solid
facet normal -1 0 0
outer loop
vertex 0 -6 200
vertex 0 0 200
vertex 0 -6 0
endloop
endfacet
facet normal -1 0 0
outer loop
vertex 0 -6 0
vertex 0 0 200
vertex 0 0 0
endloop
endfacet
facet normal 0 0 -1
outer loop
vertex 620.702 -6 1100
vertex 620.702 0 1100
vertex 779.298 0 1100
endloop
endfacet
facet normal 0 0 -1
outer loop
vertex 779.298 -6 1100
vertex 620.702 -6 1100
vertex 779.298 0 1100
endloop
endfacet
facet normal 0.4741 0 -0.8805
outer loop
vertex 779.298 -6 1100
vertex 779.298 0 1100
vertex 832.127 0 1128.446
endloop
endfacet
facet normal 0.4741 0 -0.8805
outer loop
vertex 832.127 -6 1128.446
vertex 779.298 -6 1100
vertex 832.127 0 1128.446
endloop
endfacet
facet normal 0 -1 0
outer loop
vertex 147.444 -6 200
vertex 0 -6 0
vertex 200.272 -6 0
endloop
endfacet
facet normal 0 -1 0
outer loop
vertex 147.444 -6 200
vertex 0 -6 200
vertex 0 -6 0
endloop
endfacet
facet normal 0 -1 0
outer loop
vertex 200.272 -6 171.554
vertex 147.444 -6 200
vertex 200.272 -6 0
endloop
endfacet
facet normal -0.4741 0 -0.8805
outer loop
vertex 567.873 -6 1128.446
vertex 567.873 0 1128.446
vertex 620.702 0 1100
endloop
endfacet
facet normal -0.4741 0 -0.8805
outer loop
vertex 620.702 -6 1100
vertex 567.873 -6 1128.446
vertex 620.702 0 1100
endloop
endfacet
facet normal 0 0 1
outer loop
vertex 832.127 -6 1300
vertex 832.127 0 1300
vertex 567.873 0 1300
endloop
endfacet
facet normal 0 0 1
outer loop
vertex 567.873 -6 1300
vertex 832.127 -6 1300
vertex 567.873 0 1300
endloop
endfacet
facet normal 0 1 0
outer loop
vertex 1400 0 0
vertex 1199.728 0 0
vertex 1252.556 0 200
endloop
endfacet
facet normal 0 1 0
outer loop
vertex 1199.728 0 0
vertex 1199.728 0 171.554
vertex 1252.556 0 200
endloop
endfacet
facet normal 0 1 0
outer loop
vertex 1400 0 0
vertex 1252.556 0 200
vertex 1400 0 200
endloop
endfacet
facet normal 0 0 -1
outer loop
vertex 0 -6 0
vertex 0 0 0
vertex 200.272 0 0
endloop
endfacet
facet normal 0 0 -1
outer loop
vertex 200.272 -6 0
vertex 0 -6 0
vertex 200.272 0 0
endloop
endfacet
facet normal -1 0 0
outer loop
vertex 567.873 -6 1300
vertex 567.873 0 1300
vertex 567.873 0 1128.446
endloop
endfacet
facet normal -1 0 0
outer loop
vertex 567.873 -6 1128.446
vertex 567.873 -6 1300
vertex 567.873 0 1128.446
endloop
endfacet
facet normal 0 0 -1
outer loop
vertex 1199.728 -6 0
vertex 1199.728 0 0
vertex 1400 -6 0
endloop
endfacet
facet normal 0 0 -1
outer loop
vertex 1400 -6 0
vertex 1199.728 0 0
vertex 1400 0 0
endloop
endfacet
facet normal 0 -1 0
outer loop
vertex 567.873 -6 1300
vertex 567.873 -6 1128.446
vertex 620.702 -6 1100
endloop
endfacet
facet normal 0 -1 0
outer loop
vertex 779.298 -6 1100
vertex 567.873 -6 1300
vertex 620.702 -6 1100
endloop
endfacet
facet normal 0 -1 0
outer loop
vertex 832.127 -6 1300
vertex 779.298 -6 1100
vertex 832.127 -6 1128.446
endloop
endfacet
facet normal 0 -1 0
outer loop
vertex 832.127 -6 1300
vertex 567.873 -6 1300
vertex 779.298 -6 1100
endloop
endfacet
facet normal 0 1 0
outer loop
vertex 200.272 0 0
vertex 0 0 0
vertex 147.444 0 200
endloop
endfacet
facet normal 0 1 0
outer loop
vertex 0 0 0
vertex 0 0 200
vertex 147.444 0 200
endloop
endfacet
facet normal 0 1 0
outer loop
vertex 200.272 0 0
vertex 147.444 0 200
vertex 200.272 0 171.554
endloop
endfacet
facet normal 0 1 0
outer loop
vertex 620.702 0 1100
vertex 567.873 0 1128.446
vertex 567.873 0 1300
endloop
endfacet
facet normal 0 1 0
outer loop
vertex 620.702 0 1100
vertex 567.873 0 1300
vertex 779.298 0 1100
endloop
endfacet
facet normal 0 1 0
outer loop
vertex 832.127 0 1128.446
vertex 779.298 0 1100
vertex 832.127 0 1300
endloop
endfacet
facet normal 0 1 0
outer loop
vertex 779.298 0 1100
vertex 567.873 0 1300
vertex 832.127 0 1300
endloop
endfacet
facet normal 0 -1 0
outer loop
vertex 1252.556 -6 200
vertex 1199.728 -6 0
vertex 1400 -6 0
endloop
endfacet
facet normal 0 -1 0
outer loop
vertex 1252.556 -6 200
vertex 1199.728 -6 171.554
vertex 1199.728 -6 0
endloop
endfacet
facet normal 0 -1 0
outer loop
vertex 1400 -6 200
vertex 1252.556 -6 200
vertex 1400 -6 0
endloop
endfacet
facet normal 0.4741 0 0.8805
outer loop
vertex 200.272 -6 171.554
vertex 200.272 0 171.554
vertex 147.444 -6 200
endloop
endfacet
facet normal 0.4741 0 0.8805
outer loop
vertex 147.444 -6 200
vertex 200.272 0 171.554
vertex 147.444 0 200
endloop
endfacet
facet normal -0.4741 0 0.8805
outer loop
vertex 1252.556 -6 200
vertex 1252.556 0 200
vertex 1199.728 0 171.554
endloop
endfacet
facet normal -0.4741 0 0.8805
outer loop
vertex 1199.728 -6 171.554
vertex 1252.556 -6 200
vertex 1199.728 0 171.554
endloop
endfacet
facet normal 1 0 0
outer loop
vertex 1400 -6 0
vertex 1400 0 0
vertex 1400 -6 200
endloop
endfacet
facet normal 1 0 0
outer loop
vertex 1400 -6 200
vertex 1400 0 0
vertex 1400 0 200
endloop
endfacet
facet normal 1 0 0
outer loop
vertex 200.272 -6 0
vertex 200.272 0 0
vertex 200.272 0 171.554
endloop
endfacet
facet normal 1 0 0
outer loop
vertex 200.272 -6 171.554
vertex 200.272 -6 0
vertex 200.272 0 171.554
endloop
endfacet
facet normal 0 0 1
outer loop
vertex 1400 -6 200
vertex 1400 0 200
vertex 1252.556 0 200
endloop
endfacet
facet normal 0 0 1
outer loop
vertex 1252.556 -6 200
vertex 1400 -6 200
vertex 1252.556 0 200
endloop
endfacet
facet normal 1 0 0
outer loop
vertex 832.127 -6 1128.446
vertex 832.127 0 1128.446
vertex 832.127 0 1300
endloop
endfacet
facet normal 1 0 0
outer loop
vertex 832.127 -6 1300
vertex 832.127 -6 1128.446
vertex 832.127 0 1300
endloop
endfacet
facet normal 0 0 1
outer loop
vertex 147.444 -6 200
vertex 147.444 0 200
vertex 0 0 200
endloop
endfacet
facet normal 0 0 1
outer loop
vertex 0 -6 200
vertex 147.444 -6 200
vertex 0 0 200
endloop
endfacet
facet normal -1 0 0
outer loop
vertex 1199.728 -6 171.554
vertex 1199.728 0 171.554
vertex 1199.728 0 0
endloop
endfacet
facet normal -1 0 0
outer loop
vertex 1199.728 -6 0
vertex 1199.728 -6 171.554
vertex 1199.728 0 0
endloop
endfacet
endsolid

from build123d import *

# Parameters (mm, degrees)
EXTRUDE_DEPTH = 6


with BuildPart() as part:
    # Sketch → Extrude (new body)
    with BuildSketch(Plane.XZ):
        Polygon((0, 0), (200.27202, 0), (200.27202, 171.554011), (147.443754, 200), (0, 200), align=None)
        Polygon((620.701583, 1100), (779.298417, 1100), (832.126683, 1128.445989), (832.126683, 1300), (567.873317, 1300), (567.873317, 1128.445989), align=None)
        Polygon((1199.72798, 0), (1400, 0), (1400, 200), (1252.556246, 200), (1199.72798, 171.554011), align=None)
    extrude(amount=EXTRUDE_DEPTH)


solid = part.part
